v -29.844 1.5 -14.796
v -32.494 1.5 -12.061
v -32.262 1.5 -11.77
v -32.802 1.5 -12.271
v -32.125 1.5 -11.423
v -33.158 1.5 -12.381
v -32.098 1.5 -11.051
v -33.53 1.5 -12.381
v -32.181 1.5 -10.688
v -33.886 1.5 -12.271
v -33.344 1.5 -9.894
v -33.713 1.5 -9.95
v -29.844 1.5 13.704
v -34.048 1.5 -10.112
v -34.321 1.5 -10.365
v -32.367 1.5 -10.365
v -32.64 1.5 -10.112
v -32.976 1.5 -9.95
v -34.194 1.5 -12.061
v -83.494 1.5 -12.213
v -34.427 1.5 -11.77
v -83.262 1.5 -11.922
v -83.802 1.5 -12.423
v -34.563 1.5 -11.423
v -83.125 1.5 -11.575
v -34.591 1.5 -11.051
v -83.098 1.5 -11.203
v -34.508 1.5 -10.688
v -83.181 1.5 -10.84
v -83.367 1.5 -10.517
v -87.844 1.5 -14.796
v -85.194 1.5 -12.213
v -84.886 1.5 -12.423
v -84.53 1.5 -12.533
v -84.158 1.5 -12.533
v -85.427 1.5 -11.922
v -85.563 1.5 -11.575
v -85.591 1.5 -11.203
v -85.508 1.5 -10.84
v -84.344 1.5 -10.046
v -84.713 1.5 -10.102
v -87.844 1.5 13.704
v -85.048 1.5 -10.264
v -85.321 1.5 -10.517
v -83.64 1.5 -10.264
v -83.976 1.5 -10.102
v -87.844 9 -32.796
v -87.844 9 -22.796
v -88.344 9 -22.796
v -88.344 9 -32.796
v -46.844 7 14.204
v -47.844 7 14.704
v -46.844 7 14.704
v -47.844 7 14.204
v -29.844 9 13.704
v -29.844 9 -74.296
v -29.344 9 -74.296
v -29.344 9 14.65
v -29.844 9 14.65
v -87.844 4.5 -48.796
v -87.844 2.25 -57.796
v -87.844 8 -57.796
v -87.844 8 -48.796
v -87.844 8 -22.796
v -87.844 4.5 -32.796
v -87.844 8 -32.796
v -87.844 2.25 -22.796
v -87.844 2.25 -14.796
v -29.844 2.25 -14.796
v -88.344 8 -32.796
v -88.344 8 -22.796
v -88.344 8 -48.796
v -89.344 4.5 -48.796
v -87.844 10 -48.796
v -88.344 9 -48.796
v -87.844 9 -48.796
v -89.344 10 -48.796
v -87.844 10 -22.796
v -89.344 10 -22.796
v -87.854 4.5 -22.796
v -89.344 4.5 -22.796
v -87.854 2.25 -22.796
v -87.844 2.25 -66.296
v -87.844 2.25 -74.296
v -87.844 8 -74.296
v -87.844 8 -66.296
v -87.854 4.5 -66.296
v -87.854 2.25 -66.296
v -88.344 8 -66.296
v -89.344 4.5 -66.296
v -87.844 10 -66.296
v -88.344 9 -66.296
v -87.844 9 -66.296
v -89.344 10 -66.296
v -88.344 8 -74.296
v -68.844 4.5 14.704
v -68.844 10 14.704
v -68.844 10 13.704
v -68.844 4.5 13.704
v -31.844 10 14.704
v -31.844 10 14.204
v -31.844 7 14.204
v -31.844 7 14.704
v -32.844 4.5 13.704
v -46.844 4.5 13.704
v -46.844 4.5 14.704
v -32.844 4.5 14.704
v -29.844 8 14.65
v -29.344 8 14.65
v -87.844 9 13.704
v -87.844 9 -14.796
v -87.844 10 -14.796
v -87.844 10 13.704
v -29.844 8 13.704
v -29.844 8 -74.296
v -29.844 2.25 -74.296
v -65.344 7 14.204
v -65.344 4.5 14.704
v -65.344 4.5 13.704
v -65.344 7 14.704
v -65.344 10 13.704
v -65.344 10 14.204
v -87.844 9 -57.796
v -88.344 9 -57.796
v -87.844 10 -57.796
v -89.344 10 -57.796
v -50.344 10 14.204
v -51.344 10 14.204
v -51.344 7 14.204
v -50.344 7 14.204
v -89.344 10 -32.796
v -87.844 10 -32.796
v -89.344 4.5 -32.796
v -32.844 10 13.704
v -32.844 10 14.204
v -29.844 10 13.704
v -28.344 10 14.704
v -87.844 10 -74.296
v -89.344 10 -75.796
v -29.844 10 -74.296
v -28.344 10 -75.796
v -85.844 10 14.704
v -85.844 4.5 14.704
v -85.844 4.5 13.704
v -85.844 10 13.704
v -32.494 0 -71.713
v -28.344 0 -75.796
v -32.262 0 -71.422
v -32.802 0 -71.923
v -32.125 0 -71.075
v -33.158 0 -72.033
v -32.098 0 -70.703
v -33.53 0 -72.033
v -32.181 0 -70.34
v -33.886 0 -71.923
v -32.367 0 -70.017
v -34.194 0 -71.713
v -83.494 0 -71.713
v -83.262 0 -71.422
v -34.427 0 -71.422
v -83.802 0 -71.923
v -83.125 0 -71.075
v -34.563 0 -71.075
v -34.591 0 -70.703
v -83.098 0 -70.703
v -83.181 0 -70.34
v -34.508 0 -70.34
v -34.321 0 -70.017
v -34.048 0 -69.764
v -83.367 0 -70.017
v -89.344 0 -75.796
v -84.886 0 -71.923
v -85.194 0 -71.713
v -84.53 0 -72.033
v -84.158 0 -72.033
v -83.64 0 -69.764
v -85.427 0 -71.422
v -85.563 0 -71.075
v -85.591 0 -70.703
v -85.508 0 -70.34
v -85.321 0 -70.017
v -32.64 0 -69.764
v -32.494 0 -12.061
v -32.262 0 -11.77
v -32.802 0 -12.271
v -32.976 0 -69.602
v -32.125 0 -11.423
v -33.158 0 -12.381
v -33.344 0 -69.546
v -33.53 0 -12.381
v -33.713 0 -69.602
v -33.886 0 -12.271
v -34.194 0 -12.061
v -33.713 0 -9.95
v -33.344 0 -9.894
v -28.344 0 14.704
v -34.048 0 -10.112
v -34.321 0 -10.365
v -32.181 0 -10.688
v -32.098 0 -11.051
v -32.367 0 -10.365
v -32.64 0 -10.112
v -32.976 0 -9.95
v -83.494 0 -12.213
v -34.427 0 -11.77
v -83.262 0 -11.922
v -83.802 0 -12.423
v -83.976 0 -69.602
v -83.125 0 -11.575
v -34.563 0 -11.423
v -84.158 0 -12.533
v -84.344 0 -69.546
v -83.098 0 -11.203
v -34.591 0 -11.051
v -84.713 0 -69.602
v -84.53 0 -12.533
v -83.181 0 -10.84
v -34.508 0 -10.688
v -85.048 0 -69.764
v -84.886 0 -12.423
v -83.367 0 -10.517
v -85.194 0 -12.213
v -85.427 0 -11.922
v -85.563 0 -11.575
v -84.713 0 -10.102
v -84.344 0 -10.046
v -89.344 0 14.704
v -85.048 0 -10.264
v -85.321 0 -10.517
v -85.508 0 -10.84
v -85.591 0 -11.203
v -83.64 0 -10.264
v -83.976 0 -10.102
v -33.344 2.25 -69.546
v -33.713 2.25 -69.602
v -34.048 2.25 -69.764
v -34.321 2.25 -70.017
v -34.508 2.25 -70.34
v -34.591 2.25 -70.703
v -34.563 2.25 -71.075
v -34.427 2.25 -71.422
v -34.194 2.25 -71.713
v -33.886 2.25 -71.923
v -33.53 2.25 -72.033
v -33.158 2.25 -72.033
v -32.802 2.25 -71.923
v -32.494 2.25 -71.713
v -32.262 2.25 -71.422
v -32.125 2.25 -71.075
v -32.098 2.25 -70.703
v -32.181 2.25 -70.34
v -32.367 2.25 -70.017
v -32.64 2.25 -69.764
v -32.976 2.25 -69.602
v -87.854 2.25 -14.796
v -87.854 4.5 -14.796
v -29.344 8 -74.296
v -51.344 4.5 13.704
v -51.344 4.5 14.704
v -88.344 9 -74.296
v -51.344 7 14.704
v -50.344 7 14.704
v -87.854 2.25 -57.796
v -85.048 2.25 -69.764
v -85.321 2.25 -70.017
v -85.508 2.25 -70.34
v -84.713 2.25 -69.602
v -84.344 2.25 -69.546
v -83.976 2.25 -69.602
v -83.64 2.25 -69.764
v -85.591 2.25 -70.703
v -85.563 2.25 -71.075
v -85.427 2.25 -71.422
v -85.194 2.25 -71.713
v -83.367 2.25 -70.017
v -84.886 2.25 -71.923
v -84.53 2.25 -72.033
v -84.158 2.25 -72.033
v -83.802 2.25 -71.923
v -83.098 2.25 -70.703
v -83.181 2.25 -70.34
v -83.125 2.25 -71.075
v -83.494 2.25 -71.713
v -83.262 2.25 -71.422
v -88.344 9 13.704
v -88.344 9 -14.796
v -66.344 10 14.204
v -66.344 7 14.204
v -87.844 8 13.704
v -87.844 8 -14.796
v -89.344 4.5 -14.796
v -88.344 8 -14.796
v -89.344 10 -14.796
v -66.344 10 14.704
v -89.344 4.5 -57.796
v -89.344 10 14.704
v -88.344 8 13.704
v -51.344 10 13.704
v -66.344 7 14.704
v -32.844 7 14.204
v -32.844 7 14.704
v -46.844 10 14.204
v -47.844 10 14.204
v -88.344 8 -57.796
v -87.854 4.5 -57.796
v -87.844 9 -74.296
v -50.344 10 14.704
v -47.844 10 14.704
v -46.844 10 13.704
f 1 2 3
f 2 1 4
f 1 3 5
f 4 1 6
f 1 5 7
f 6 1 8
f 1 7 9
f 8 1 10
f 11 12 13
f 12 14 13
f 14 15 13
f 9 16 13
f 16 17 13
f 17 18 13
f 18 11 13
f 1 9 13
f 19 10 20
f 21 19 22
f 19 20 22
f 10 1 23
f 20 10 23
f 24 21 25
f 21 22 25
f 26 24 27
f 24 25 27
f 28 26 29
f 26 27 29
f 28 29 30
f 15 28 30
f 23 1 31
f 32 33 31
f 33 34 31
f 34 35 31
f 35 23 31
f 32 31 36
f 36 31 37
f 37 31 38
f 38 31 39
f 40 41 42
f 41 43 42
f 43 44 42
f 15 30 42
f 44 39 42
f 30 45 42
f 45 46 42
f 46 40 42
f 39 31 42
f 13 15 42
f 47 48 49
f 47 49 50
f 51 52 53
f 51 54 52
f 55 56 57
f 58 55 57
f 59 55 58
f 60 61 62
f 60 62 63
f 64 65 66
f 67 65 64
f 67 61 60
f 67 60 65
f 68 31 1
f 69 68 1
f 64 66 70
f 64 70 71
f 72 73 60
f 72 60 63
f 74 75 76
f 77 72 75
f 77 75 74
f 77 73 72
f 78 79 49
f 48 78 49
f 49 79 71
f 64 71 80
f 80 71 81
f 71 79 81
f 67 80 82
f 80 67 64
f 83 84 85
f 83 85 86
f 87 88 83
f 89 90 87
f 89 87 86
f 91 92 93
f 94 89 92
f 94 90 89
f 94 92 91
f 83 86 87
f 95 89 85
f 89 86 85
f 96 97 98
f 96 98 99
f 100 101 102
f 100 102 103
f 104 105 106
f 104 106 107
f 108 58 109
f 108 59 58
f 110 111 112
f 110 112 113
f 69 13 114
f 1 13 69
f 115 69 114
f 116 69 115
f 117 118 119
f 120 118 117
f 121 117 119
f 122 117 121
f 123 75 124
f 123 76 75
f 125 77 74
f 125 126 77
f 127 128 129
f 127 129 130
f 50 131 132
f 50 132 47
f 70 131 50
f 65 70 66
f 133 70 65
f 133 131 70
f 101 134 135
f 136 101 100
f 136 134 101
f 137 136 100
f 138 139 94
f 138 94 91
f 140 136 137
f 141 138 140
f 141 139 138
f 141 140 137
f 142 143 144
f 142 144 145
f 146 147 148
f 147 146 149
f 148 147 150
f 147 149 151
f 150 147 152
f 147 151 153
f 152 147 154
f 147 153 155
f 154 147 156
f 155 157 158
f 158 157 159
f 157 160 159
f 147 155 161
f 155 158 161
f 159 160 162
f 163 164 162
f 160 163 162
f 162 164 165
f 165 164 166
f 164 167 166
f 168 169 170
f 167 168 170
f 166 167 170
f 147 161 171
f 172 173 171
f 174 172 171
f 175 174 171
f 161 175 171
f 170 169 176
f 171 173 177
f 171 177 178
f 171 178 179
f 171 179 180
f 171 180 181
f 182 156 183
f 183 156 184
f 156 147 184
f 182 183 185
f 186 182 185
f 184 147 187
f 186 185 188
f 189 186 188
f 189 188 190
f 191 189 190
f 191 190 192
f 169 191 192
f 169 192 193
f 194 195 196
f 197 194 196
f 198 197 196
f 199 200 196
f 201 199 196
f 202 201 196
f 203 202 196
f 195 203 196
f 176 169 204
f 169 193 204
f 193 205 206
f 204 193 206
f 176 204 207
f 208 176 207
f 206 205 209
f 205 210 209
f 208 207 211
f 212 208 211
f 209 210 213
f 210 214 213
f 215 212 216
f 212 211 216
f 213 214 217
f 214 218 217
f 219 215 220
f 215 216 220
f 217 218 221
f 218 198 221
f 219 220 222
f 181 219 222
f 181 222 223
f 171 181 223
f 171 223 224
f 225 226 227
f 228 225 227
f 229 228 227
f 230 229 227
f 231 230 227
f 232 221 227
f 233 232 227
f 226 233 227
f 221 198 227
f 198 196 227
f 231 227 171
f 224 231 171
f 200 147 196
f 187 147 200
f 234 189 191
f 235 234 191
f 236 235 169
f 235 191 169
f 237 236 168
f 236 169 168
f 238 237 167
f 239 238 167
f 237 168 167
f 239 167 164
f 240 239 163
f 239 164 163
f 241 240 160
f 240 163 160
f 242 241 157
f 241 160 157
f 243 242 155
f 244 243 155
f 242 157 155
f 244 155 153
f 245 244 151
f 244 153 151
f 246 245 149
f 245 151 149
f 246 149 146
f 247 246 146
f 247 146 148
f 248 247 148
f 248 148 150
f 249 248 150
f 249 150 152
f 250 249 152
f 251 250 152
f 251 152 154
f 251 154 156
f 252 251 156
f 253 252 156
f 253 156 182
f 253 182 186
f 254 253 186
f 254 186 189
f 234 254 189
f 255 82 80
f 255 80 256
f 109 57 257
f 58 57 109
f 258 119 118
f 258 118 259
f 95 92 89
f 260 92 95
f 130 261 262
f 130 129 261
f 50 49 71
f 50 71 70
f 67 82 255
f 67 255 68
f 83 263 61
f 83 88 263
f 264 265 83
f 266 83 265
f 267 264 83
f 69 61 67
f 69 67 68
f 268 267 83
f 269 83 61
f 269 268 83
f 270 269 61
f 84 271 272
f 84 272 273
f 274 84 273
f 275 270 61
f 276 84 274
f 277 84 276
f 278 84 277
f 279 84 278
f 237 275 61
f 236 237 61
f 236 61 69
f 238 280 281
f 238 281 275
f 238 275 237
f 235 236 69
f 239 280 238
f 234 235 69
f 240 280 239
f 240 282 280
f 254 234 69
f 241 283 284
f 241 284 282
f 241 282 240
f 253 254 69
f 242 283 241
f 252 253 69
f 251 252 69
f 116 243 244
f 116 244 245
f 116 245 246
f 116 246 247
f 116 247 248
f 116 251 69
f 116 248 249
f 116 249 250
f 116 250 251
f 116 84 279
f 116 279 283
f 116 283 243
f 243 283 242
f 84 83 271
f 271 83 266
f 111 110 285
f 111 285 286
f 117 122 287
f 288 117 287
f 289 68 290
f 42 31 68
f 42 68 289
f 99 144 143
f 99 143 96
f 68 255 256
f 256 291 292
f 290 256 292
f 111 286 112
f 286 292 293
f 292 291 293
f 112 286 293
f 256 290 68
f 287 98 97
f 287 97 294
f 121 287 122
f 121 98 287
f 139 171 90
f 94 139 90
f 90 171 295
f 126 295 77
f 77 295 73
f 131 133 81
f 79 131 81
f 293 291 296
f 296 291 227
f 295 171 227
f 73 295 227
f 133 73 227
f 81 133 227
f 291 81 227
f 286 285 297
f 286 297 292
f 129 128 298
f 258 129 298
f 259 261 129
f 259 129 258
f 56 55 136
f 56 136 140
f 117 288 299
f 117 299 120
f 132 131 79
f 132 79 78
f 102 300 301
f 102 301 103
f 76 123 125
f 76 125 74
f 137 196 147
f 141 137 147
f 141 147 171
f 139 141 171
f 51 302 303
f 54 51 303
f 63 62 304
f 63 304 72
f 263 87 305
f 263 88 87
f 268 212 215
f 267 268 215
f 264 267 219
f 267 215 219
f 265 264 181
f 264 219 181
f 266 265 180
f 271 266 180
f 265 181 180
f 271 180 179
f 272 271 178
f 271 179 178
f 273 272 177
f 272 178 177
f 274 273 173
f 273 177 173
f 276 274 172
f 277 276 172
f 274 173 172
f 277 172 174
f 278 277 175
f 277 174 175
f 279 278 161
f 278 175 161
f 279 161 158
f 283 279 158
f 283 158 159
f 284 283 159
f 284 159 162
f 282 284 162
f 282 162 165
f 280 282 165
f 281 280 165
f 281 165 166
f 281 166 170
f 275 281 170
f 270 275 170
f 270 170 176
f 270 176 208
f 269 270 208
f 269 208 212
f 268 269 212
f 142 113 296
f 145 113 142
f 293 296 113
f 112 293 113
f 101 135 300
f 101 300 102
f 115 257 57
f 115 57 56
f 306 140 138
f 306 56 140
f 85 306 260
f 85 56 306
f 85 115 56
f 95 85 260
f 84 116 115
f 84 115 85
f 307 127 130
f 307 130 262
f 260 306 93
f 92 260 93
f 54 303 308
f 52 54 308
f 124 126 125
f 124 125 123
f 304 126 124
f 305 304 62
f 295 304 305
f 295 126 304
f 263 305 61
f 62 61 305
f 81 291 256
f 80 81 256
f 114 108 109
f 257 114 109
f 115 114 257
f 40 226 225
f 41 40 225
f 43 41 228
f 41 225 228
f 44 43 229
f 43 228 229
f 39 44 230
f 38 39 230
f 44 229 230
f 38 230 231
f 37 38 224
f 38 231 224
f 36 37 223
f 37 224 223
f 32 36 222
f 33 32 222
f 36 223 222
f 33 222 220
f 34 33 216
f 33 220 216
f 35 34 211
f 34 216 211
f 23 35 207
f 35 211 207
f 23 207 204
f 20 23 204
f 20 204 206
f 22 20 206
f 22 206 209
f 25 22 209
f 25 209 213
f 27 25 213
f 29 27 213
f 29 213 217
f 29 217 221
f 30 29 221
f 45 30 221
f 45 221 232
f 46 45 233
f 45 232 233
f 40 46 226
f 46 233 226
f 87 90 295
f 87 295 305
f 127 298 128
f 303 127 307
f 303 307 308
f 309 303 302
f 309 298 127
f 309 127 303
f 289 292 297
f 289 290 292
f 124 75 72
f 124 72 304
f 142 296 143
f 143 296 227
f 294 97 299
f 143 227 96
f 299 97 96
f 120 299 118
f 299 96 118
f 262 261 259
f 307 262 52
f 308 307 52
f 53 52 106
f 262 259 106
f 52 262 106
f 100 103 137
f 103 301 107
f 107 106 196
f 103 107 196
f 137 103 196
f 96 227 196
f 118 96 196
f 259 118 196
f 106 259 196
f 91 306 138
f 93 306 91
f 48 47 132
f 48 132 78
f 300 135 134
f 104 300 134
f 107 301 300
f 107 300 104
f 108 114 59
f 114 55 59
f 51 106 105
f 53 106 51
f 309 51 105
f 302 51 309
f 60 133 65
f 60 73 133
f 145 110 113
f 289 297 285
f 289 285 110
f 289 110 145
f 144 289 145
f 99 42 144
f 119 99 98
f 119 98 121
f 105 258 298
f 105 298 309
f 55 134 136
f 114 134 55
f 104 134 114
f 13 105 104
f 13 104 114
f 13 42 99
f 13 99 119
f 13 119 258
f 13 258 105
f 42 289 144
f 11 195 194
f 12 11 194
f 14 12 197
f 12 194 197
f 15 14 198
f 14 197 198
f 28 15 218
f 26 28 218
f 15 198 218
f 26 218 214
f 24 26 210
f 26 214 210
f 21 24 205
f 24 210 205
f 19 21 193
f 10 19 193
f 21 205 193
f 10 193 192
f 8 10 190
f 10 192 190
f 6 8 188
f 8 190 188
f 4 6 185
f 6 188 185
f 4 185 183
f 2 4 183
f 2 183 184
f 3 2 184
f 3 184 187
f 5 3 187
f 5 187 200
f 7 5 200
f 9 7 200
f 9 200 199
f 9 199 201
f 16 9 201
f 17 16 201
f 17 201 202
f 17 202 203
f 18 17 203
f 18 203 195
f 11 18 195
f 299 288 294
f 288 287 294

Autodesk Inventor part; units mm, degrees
ref_plane "YZ Plane" through (0, 0, 0) normal (1, 0, 0) x (0, 1, 0)
ref_plane "XZ Plane" through (0, 0, 0) normal (0, 1, 0) x (-1, 0, 0)
ref_plane "XY Plane" through (0, 0, 0) normal (0, 0, 1) x (1, 0, 0)
sketch "Sketch1" plane through (0, 0, 0) normal (0, 1, 0) x (-1, 0, 0)
  line L0 (89.3441, 14.7035) -> (28.3441, 14.7035)
  line L1 (28.3441, 14.7035) -> (28.3441, -75.7965)
  line L2 (28.3441, -75.7965) -> (89.3441, -75.7965)
  line L3 (89.3441, -75.7965) -> (89.3441, 14.7035)
  point P0 (0, 0)
  dimension "d0" = 90.5
  dimension "d1" = 61
extrude "Extrusion1" add sketch "Sketch1" along normal blind 1.5
sketch "Sketch2" plane through (0, 1.5, 0) normal (0, 1, 0) x (1, 0, 0)
  line L0 (-87.8441, -13.7035) -> (-29.8441, -13.7035)
  line L1 (-29.8441, -13.7035) -> (-29.8441, 74.2965)
  line L2 (-29.8441, 74.2965) -> (-87.8441, 74.2965)
  line L3 (-87.8441, 74.2965) -> (-87.8441, -13.7035)
  line L4 (-28.3441, 75.7965) -> (-89.3441, 75.7965) projected
  line L5 (-89.3441, -14.7035) -> (-28.3441, -14.7035) projected
  line L6 (-28.3441, -14.7035) -> (-28.3441, 75.7965) projected
  line L7 (-89.3441, 75.7965) -> (-89.3441, -14.7035) projected
  point P0 (0, 0)
  dimension "d4" = 1.5
  dimension "d5" = 1
  dimension "d6" = 1.5
  dimension "d7" = 1.5
extrude "Extrusion2" add sketch "Sketch2" along normal blind 8.5
sketch "Sketch3" plane through (-89.3441, 0, 14.7035) normal (0, 0, 1) x (1, 0, 0)
  line L0 (61, 0) -> (61, 10) projected
  line L1 (0, 0) -> (0, 10) projected
  line L2 (59.5, 1.5) -> (59.5, 10) projected
  line L3 (1.5, 1.5) -> (1.5, 10) projected
  line L4 (0, 0) -> (61, 0) projected
  line L5 (1.5, 1.5) -> (59.5, 1.5) projected
  line L6 (0, 10) -> (61, 10) projected
  line L7 (42.5, 10) -> (56.5, 10)
  line L8 (56.5, 10) -> (56.5, 1.5)
  line L9 (56.5, 1.5) -> (42.5, 1.5)
  line L10 (42.5, 1.5) -> (42.5, 10)
  line L11 (24, 10) -> (38, 10)
  line L12 (38, 10) -> (38, 1.5)
  line L13 (38, 1.5) -> (24, 1.5)
  line L14 (24, 1.5) -> (24, 10)
  line L15 (3.5, 10) -> (20.5, 10)
  line L16 (20.5, 10) -> (20.5, 1.5)
  line L17 (20.5, 1.5) -> (3.5, 1.5)
  line L18 (3.5, 1.5) -> (3.5, 10)
  point P0 (89.3441, 0)
  dimension "d10" = 61
  dimension "d11" = 58
  dimension "d12" = 1.5
  dimension "d13" = 10
  dimension "d14" = 3
  dimension "d15" = 14
  dimension "d16" = 14
  dimension "d17" = 4.5
  dimension "d18" = 3.5
  dimension "d19" = 17
  dimension "d20" = 2
extrude "Extrusion3" cut sketch "Sketch3" against normal blind 2 contours L8 L5 L10 L6 | L6 L16 L5 L18 | L12 L5 L14 L6
sketch "Sketch4" plane through (-89.3441, 0, -75.7965) normal (-1, 0, 0) x (0, 0, 1)
  line L0 (90.5, 0) -> (90.5, 10) projected
  line L1 (0, 0) -> (0, 10) projected
  line L2 (89.5, 1.5) -> (89.5, 10) projected
  line L3 (1.5, 1.5) -> (1.5, 10) projected
  line L4 (0, 0) -> (90.5, 0) projected
  line L5 (1.5, 1.5) -> (89.5, 1.5) projected
  line L6 (0, 10) -> (90.5, 10) projected
  line L7 (61, 10) -> (53, 10)
  line L8 (53, 10) -> (53, 1.5)
  line L9 (53, 1.5) -> (61, 1.5)
  line L10 (61, 1.5) -> (61, 10)
  line L11 (89.5, 10) -> (1.5, 10) projected
  line L12 (89.5, 1.5) -> (1.5, 1.5) projected
  line L13 (27, 10) -> (43, 10)
  line L14 (43, 10) -> (43, 1.5)
  line L15 (43, 1.5) -> (27, 1.5)
  line L16 (27, 1.5) -> (27, 10)
  line L17 (9.5, 10) -> (18, 10)
  line L18 (18, 10) -> (18, 1.5)
  line L19 (18, 1.5) -> (9.5, 1.5)
  line L20 (9.5, 1.5) -> (9.5, 10)
  point P0 (75.7965, 0)
  dimension "d23" = 90.5
  dimension "d24" = 88
  dimension "d25" = 1.5
  dimension "d26" = 10
  dimension "d27" = 28.5
  dimension "d28" = 8
  dimension "d29" = 10
  dimension "d30" = 16
  dimension "d31" = 9
  dimension "d32" = 8.5
  dimension "d33" = 8
extrude "Extrusion4" cut sketch "Sketch4" against normal blind 2 contours L10 L5 L8 L6 | L6 L18 L5 L20 | L14 L5 L16 L6
sketch "Sketch5" plane through (0, 10, 0) normal (0, 1, 0) x (1, 0, 0)
  line L0 (-29.8441, -13.7035) -> (-32.8441, -13.7035) projected
  line L1 (-32.8441, -14.7035) -> (-28.3441, -14.7035) projected
  line L2 (-28.3441, -14.7035) -> (-28.3441, 75.7965) projected
  line L3 (-32.8441, -13.7035) -> (-32.8441, -14.7035) projected
  line L4 (-32.8441, -14.7035) -> (-32.8441, -13.7035) projected
  line L5 (-89.3441, -14.7035) -> (-28.3441, -14.7035) projected
  line L6 (-32.8441, -14.2035) -> (-31.8441, -14.2035)
  line L7 (-31.8441, -14.2035) -> (-31.8441, -14.7035)
  line L8 (-31.8441, -14.7035) -> (-32.8441, -14.7035)
  line L9 (-32.8441, -14.7035) -> (-32.8441, -14.2035)
  point P0 (0, 0)
  dimension "d36" = 1
  dimension "d37" = 4.5
  dimension "d38" = 0.5
  dimension "d39" = 1
extrude "Extrusion5" cut sketch "Sketch5" against normal blind 3
sketch "Sketch6" plane through (0, 10, 0) normal (0, 1, 0) x (1, 0, 0)
  line L0 (-51.3441, -14.7035) -> (-46.8441, -14.7035) projected
  line L1 (-46.8441, -13.7035) -> (-51.3441, -13.7035) projected
  line L2 (-46.8441, -14.7035) -> (-46.8441, -13.7035) projected
  line L3 (-51.3441, -14.7035) -> (-51.3441, -13.7035) projected
  line L4 (-46.8441, -14.2035) -> (-47.8441, -14.2035)
  line L5 (-47.8441, -14.2035) -> (-47.8441, -14.7035)
  line L6 (-47.8441, -14.7035) -> (-46.8441, -14.7035)
  line L7 (-46.8441, -14.7035) -> (-46.8441, -14.2035)
  point P0 (0, 0)
  dimension "d42" = 1
  dimension "d43" = 4.5
  dimension "d44" = 0.5
  dimension "d45" = 1
extrude "Extrusion6" cut sketch "Sketch6" against normal blind 3 contours L5 L4 L2 L0
sketch "Sketch7" plane through (0, 10, 0) normal (0, 1, 0) x (1, 0, 0)
  line L0 (-46.8441, -13.7035) -> (-51.3441, -13.7035) projected
  line L1 (-51.3441, -14.7035) -> (-47.8441, -14.7035) projected
  line L2 (-46.8441, -14.2035) -> (-46.8441, -13.7035) projected
  line L3 (-51.3441, -13.7035) -> (-51.3441, -14.7035) projected
  line L4 (-46.8441, -14.7035) -> (-47.8441, -14.7035) projected
  line L5 (-47.8441, -14.2035) -> (-46.8441, -14.2035) projected
  line L6 (-51.3441, -14.2035) -> (-50.3441, -14.2035)
  line L7 (-50.3441, -14.2035) -> (-50.3441, -14.7035)
  line L8 (-50.3441, -14.7035) -> (-51.3441, -14.7035)
  line L9 (-51.3441, -14.7035) -> (-51.3441, -14.2035)
  point P0 (0, 0)
  dimension "d48" = 1
  dimension "d49" = 4.5
  dimension "d50" = 0.5
  dimension "d51" = 0.5
  dimension "d52" = 1
extrude "Extrusion7" cut sketch "Sketch7" against normal blind 3
sketch "Sketch8" plane through (0, 10, 0) normal (0, 1, 0) x (1, 0, 0)
  line L0 (-65.3441, -13.7035) -> (-68.8441, -13.7035) projected
  line L1 (-68.8441, -14.7035) -> (-65.3441, -14.7035) projected
  line L2 (-68.8441, -13.7035) -> (-68.8441, -14.7035) projected
  line L3 (-65.3441, -14.7035) -> (-65.3441, -13.7035) projected
  line L4 (-65.3441, -14.7035) -> (-65.3441, -13.7035) projected
  line L5 (-65.3441, -14.2035) -> (-66.3441, -14.2035)
  line L6 (-66.3441, -14.2035) -> (-66.3441, -14.7035)
  line L7 (-66.3441, -14.7035) -> (-65.3441, -14.7035)
  line L8 (-65.3441, -14.7035) -> (-65.3441, -14.2035)
  point P0 (0, 0)
  dimension "d55" = 1
  dimension "d56" = 3.5
  dimension "d57" = 1
  dimension "d58" = 0.5
extrude "Extrusion8" cut sketch "Sketch8" against normal blind 3 contours L3 L1 L6 L5
sketch "Sketch9" plane through (-29.8441, 1.5, -74.2965) normal (-1, 0, 0) x (0, 0, 1)
  line L0 (0, 0) -> (0, 8.5) projected
  line L1 (0, 7.5) -> (88.9462, 7.5)
  line L2 (88.9462, 7.5) -> (88.9462, 6.5)
  line L3 (88.9462, 6.5) -> (0, 6.5)
  line L4 (0, 6.5) -> (0, 7.5)
  line L5 (0, 8.5) -> (88, 8.5) projected
  point P0 (74.2965, -1.5)
  dimension "d61" = 1
  dimension "d62" = 88.9462
  dimension "d63" = 1
extrude "Extrusion9" cut sketch "Sketch9" against normal blind 0.5
sketch "Sketch10" plane through (-87.8441, 1.5, 13.7035) normal (1, 0, 0) x (0, 0, -1)
  line L0 (28.5, 0) -> (28.5, 8.5) projected
  line L1 (0, 7.5) -> (28.5, 7.5)
  line L2 (28.5, 7.5) -> (28.5, 6.5)
  line L3 (28.5, 6.5) -> (0, 6.5)
  line L4 (0, 6.5) -> (0, 7.5)
  line L5 (0, 8.5) -> (28.5, 8.5) projected
  point P0 (13.7035, -1.5)
  dimension "d66" = 28.5
  dimension "d67" = 1
  dimension "d68" = 1
extrude "Extrusion10" cut sketch "Sketch10" against normal blind 0.5
sketch "Sketch11" plane through (-87.8441, 1.5, -22.7965) normal (1, 0, 0) x (0, 0, -1)
  line L0 (0, 8.5) -> (0, 0) projected
  line L1 (10, 0) -> (10, 8.5) projected
  line L2 (0, 7.5) -> (10, 7.5)
  line L3 (10, 7.5) -> (10, 6.5)
  line L4 (10, 6.5) -> (0, 6.5)
  line L5 (0, 6.5) -> (0, 7.5)
  line L6 (0, 8.5) -> (10, 8.5) projected
  point P0 (-22.7965, -1.5)
  dimension "d71" = 10
  dimension "d72" = 1
  dimension "d73" = 1
extrude "Extrusion11" cut sketch "Sketch11" against normal blind 0.5 contours L2 L1 L4 L0
sketch "Sketch12" plane through (-87.8441, 1.5, -48.7965) normal (1, 0, 0) x (0, 0, -1)
  line L0 (0, 8.5) -> (0, 0) projected
  line L1 (9, 0) -> (9, 8.5) projected
  line L2 (0, 7.5) -> (9, 7.5)
  line L3 (9, 7.5) -> (9, 6.5)
  line L4 (9, 6.5) -> (0, 6.5)
  line L5 (0, 6.5) -> (0, 7.5)
  line L6 (0, 8.5) -> (9, 8.5) projected
  point P0 (-48.7965, -1.5)
  dimension "d76" = 1
  dimension "d77" = 1
extrude "Extrusion12" cut sketch "Sketch12" against normal blind 0.5 contours L2 L1 L4 L0
sketch "Sketch13" plane through (-87.8441, 1.5, -74.2965) normal (1, 0, 0) x (0, 0, -1)
  line L0 (0, 0) -> (0, 8.5) projected
  line L1 (-8, 8.5) -> (-8, 0) projected
  line L2 (0, 7.5) -> (-8, 7.5)
  line L3 (-8, 7.5) -> (-8, 6.5)
  line L4 (-8, 6.5) -> (0, 6.5)
  line L5 (0, 6.5) -> (0, 7.5)
  line L6 (-8, 8.5) -> (0, 8.5) projected
  point P0 (-74.2965, -1.5)
  dimension "d80" = 1
  dimension "d81" = 1
extrude "Extrusion13" cut sketch "Sketch13" against normal blind 0.5 contours L4 L1 L2 L0
sketch "Sketch16" plane through (0, 1.5, 0) normal (0, 1, 0) x (1, 0, 0)
  line L0 (-87.8539, 14.7789) -> (-29.8441, 14.7789)
  line L1 (-29.8441, 14.7789) -> (-29.8441, 74.2965)
  line L2 (-29.8441, 74.2965) -> (-87.8539, 74.2965)
  line L3 (-87.8539, 74.2965) -> (-87.8539, 14.7789)
  line L4 (-89.3441, 22.7965) -> (-87.8539, 22.7965)
  line L5 (-87.8539, 22.7965) -> (-87.8539, 14.7789)
  line L6 (-87.8539, 14.7789) -> (-89.3441, 14.7789)
  line L7 (-89.3441, 14.7789) -> (-89.3441, 22.7965)
  line L8 (-89.3441, 48.7965) -> (-87.8441, 48.7965)
  line L9 (-87.8441, 48.7965) -> (-87.8441, 32.7965)
  line L10 (-87.8441, 32.7965) -> (-89.3441, 32.7965)
  line L11 (-89.3441, 32.7965) -> (-89.3441, 48.7965)
  line L12 (-89.3441, 66.2965) -> (-87.8539, 66.2965)
  line L13 (-87.8539, 66.2965) -> (-87.8539, 57.7072)
  line L14 (-87.8539, 57.7072) -> (-89.3441, 57.7072)
  line L15 (-89.3441, 57.7072) -> (-89.3441, 66.2965)
  line L16 (-89.3441, 66.2965) -> (-87.8539, 66.2965)
  line L17 (-87.8539, 66.2965) -> (-87.8539, 57.7072)
  line L18 (-87.8539, 57.7072) -> (-89.3441, 57.7072)
  line L19 (-89.3441, 57.7072) -> (-89.3441, 66.2965)
  line L20 (-85.8441, -13.7035) -> (-68.8441, -13.7035)
  line L21 (-68.8441, -13.7035) -> (-68.8441, -14.7035)
  line L22 (-68.8441, -14.7035) -> (-85.8441, -14.7035)
  line L23 (-85.8441, -14.7035) -> (-85.8441, -13.7035)
  line L24 (-65.3441, -13.7035) -> (-51.3441, -13.7035)
  line L25 (-51.3441, -13.7035) -> (-51.3441, -14.7035)
  line L26 (-51.3441, -14.7035) -> (-65.3441, -14.7035)
  line L27 (-65.3441, -14.7035) -> (-65.3441, -13.7035)
  line L28 (-46.8441, -13.7035) -> (-32.8441, -13.7035)
  line L29 (-32.8441, -13.7035) -> (-32.8441, -14.7035)
  line L30 (-32.8441, -14.7035) -> (-46.8441, -14.7035)
  line L31 (-46.8441, -14.7035) -> (-46.8441, -13.7035)
  point P0 (0, 0)
extrude "Extrusion16" add sketch "Sketch16" along normal blind 3 contours L6 L7 L4 L3 | L10 L11 L8 L3 | L3 L8 L9 L10 | L3 L14 L15 L12 | L20 L21 L22 L23 | L24 L25 L26 L27 | L28 L29 L30 L31
sketch "Sketch17" plane through (0, 1.5, 0) normal (0, 1, 0) x (1, 0, 0)
  line L0 (-87.8539, 14.7965) -> (-29.8441, 14.7965)
  line L1 (-29.8441, 14.7965) -> (-29.8441, 74.2965)
  line L2 (-29.8441, 74.2965) -> (-87.8539, 74.2965)
  line L3 (-87.8539, 74.2965) -> (-87.8539, 14.7965)
  point P0 (0, 0)
extrude "Extrusion17" add sketch "Sketch17" along normal blind 0.75
hole "Hole1" at (-84.3441, 1.5, -11.2965) direction (0, -1, 0) diameter 2.5 end through all
hole "Hole2" at (-33.3441, 1.5, -11.1445) direction (0, -1, 0) diameter 2.5 end through all
hole "Hole3" at (-84.3441, 2.25, -70.7965) direction (0, -1, 0) diameter 2.5 end through all
hole "Hole4" at (-33.3441, 2.25, -70.7965) direction (0, -1, 0) diameter 2.5 end through all
properties part number "raspi_enclosure"
